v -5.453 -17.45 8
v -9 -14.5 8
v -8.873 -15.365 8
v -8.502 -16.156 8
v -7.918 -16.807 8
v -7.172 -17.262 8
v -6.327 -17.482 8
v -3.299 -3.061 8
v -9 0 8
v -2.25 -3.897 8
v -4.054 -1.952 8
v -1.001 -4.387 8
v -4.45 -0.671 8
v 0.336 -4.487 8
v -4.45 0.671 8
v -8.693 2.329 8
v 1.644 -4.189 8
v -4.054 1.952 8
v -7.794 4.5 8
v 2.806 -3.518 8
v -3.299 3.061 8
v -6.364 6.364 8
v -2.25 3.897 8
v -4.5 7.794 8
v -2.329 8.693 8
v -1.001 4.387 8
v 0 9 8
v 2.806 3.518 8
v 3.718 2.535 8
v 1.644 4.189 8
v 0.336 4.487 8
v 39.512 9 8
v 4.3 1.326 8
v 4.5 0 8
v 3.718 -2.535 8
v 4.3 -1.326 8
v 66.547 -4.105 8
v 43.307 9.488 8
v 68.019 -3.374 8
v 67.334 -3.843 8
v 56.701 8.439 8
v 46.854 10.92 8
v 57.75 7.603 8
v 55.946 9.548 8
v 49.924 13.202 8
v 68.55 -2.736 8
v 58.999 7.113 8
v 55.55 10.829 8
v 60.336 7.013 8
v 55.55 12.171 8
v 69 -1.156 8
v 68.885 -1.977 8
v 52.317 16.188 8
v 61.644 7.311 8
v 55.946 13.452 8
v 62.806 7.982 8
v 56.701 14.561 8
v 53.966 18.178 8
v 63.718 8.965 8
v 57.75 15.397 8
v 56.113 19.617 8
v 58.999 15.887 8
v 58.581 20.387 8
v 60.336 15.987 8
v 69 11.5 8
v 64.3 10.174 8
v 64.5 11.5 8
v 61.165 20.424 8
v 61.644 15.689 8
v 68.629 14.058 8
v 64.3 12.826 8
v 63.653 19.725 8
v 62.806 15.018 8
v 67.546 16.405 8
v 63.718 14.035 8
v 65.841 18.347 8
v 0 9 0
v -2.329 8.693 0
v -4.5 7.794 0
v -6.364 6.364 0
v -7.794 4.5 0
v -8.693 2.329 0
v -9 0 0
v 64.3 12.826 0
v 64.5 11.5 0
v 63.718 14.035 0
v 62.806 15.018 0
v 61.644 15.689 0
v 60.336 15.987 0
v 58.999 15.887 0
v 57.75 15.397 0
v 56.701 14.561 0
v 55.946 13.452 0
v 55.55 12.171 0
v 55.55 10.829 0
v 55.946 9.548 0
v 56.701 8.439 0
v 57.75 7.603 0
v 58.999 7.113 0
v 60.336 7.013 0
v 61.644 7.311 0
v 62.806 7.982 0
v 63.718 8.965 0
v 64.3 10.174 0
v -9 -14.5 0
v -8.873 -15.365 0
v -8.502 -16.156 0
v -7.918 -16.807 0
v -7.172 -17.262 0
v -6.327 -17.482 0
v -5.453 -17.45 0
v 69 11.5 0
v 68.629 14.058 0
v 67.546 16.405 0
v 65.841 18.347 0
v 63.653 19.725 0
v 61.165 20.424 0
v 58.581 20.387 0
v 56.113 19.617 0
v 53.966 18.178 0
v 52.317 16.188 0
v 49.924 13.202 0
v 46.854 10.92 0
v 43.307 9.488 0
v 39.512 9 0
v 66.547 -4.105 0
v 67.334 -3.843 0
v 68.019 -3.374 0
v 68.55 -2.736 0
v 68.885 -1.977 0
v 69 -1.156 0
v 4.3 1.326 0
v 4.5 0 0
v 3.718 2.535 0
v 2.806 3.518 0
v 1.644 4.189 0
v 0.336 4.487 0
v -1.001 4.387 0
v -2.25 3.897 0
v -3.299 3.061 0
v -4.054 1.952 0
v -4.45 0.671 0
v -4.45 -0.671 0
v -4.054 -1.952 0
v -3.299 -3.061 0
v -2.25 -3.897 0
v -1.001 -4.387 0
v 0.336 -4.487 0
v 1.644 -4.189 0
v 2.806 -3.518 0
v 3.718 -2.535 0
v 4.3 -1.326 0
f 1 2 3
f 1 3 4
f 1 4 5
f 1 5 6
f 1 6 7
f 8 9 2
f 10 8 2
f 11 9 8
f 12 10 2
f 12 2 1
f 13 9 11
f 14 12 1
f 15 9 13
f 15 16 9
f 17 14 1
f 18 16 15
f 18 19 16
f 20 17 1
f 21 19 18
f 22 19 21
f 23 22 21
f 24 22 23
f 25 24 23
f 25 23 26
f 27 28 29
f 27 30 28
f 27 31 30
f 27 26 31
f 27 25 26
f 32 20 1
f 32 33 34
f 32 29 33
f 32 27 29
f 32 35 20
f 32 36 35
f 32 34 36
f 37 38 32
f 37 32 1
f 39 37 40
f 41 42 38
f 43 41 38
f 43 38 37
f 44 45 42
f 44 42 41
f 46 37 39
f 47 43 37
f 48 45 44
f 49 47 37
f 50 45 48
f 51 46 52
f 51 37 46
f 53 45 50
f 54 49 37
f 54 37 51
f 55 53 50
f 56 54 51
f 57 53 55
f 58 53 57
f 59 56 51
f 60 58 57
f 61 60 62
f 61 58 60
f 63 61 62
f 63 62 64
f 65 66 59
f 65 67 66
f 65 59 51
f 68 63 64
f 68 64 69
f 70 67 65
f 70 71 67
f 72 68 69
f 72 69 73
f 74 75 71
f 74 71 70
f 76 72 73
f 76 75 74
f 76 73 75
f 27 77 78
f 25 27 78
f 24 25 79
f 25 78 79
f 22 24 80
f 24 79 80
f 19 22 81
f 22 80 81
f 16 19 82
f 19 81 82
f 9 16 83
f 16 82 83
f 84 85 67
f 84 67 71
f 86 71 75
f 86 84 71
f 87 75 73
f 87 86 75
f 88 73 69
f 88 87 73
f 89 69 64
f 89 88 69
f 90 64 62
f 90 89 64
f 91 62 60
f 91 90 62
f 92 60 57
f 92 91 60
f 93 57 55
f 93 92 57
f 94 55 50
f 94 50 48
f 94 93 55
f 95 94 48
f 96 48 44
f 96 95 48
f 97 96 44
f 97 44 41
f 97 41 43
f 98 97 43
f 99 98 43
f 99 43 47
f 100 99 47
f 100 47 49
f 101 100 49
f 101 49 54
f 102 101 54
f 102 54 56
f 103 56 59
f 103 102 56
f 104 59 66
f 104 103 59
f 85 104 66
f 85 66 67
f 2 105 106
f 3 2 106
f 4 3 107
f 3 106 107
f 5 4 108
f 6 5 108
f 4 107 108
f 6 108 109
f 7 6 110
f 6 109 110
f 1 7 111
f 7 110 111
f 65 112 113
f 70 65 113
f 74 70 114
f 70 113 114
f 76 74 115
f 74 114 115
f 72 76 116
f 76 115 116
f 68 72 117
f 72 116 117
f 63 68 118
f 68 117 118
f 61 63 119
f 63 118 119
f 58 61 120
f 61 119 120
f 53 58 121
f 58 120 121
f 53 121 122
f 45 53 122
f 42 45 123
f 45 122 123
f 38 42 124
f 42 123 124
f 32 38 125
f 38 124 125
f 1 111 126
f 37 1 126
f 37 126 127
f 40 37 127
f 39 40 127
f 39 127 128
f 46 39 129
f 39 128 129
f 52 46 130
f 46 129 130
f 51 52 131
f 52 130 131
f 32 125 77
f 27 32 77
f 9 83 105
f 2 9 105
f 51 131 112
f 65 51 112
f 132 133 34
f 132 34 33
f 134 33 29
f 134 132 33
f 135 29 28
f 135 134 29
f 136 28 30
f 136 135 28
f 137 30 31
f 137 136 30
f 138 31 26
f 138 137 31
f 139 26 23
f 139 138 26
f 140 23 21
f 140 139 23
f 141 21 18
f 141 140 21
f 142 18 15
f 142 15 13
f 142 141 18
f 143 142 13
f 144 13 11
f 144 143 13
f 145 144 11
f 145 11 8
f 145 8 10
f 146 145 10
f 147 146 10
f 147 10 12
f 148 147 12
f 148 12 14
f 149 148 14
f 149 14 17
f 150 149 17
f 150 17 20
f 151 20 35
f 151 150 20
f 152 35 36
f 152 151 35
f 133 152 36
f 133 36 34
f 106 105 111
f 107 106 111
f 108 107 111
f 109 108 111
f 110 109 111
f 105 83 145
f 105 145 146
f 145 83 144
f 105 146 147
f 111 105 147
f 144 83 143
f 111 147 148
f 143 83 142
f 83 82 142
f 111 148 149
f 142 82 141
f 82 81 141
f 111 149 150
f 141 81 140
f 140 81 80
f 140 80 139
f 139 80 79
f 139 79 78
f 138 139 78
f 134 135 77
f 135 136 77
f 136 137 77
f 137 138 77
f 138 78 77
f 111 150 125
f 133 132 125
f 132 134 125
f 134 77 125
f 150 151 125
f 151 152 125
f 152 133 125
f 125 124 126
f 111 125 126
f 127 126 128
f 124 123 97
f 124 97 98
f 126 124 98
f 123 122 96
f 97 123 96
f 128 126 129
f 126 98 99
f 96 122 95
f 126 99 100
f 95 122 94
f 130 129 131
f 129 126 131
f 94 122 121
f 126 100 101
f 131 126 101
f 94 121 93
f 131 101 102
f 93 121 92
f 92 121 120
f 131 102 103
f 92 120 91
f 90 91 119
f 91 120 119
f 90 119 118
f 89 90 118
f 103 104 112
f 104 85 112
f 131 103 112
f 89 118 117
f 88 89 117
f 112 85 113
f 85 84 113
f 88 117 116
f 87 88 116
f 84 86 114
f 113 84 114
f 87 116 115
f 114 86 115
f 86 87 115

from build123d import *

# Parameters (mm, degrees)
SKETCH1_R      = 4.5
EXTRUDE1_DEPTH = 8


with BuildPart() as part:
    # Sketch1 → Extrude1 (new body)
    with BuildSketch(Plane.XY):
        with BuildLine():
            Line((-9, 0), (-9, -14.5))
            ThreePointArc((-9, -14.5), (-7.918317006, -16.806525496), (-5.453293424, -17.449764723))
            Line((-5.453293424, -17.449764723), (66.546706576, -4.105353488))
            ThreePointArc((66.546706576, -4.105353488), (68.306525496, -3.073905771), (69, -1.155588765))
            Line((69, -1.155588765), (69, 11.5))
            ThreePointArc((69, 11.5), (62.434509272, 20.164477169), (52.317074532, 16.1875))
            ThreePointArc((52.317074532, 16.1875), (46.854286329, 10.91971904), (39.512198751, 9))
            Line((39.512198751, 9), (0, 9))
            ThreePointArc((0, 9), (-6.363961031, 6.363961031), (-9, 0))
        make_face()
        Circle(SKETCH1_R, mode=Mode.SUBTRACT)
        with Locations((60, 11.5)):
            Circle(SKETCH1_R, mode=Mode.SUBTRACT)
    extrude(amount=EXTRUDE1_DEPTH)


solid = part.part
